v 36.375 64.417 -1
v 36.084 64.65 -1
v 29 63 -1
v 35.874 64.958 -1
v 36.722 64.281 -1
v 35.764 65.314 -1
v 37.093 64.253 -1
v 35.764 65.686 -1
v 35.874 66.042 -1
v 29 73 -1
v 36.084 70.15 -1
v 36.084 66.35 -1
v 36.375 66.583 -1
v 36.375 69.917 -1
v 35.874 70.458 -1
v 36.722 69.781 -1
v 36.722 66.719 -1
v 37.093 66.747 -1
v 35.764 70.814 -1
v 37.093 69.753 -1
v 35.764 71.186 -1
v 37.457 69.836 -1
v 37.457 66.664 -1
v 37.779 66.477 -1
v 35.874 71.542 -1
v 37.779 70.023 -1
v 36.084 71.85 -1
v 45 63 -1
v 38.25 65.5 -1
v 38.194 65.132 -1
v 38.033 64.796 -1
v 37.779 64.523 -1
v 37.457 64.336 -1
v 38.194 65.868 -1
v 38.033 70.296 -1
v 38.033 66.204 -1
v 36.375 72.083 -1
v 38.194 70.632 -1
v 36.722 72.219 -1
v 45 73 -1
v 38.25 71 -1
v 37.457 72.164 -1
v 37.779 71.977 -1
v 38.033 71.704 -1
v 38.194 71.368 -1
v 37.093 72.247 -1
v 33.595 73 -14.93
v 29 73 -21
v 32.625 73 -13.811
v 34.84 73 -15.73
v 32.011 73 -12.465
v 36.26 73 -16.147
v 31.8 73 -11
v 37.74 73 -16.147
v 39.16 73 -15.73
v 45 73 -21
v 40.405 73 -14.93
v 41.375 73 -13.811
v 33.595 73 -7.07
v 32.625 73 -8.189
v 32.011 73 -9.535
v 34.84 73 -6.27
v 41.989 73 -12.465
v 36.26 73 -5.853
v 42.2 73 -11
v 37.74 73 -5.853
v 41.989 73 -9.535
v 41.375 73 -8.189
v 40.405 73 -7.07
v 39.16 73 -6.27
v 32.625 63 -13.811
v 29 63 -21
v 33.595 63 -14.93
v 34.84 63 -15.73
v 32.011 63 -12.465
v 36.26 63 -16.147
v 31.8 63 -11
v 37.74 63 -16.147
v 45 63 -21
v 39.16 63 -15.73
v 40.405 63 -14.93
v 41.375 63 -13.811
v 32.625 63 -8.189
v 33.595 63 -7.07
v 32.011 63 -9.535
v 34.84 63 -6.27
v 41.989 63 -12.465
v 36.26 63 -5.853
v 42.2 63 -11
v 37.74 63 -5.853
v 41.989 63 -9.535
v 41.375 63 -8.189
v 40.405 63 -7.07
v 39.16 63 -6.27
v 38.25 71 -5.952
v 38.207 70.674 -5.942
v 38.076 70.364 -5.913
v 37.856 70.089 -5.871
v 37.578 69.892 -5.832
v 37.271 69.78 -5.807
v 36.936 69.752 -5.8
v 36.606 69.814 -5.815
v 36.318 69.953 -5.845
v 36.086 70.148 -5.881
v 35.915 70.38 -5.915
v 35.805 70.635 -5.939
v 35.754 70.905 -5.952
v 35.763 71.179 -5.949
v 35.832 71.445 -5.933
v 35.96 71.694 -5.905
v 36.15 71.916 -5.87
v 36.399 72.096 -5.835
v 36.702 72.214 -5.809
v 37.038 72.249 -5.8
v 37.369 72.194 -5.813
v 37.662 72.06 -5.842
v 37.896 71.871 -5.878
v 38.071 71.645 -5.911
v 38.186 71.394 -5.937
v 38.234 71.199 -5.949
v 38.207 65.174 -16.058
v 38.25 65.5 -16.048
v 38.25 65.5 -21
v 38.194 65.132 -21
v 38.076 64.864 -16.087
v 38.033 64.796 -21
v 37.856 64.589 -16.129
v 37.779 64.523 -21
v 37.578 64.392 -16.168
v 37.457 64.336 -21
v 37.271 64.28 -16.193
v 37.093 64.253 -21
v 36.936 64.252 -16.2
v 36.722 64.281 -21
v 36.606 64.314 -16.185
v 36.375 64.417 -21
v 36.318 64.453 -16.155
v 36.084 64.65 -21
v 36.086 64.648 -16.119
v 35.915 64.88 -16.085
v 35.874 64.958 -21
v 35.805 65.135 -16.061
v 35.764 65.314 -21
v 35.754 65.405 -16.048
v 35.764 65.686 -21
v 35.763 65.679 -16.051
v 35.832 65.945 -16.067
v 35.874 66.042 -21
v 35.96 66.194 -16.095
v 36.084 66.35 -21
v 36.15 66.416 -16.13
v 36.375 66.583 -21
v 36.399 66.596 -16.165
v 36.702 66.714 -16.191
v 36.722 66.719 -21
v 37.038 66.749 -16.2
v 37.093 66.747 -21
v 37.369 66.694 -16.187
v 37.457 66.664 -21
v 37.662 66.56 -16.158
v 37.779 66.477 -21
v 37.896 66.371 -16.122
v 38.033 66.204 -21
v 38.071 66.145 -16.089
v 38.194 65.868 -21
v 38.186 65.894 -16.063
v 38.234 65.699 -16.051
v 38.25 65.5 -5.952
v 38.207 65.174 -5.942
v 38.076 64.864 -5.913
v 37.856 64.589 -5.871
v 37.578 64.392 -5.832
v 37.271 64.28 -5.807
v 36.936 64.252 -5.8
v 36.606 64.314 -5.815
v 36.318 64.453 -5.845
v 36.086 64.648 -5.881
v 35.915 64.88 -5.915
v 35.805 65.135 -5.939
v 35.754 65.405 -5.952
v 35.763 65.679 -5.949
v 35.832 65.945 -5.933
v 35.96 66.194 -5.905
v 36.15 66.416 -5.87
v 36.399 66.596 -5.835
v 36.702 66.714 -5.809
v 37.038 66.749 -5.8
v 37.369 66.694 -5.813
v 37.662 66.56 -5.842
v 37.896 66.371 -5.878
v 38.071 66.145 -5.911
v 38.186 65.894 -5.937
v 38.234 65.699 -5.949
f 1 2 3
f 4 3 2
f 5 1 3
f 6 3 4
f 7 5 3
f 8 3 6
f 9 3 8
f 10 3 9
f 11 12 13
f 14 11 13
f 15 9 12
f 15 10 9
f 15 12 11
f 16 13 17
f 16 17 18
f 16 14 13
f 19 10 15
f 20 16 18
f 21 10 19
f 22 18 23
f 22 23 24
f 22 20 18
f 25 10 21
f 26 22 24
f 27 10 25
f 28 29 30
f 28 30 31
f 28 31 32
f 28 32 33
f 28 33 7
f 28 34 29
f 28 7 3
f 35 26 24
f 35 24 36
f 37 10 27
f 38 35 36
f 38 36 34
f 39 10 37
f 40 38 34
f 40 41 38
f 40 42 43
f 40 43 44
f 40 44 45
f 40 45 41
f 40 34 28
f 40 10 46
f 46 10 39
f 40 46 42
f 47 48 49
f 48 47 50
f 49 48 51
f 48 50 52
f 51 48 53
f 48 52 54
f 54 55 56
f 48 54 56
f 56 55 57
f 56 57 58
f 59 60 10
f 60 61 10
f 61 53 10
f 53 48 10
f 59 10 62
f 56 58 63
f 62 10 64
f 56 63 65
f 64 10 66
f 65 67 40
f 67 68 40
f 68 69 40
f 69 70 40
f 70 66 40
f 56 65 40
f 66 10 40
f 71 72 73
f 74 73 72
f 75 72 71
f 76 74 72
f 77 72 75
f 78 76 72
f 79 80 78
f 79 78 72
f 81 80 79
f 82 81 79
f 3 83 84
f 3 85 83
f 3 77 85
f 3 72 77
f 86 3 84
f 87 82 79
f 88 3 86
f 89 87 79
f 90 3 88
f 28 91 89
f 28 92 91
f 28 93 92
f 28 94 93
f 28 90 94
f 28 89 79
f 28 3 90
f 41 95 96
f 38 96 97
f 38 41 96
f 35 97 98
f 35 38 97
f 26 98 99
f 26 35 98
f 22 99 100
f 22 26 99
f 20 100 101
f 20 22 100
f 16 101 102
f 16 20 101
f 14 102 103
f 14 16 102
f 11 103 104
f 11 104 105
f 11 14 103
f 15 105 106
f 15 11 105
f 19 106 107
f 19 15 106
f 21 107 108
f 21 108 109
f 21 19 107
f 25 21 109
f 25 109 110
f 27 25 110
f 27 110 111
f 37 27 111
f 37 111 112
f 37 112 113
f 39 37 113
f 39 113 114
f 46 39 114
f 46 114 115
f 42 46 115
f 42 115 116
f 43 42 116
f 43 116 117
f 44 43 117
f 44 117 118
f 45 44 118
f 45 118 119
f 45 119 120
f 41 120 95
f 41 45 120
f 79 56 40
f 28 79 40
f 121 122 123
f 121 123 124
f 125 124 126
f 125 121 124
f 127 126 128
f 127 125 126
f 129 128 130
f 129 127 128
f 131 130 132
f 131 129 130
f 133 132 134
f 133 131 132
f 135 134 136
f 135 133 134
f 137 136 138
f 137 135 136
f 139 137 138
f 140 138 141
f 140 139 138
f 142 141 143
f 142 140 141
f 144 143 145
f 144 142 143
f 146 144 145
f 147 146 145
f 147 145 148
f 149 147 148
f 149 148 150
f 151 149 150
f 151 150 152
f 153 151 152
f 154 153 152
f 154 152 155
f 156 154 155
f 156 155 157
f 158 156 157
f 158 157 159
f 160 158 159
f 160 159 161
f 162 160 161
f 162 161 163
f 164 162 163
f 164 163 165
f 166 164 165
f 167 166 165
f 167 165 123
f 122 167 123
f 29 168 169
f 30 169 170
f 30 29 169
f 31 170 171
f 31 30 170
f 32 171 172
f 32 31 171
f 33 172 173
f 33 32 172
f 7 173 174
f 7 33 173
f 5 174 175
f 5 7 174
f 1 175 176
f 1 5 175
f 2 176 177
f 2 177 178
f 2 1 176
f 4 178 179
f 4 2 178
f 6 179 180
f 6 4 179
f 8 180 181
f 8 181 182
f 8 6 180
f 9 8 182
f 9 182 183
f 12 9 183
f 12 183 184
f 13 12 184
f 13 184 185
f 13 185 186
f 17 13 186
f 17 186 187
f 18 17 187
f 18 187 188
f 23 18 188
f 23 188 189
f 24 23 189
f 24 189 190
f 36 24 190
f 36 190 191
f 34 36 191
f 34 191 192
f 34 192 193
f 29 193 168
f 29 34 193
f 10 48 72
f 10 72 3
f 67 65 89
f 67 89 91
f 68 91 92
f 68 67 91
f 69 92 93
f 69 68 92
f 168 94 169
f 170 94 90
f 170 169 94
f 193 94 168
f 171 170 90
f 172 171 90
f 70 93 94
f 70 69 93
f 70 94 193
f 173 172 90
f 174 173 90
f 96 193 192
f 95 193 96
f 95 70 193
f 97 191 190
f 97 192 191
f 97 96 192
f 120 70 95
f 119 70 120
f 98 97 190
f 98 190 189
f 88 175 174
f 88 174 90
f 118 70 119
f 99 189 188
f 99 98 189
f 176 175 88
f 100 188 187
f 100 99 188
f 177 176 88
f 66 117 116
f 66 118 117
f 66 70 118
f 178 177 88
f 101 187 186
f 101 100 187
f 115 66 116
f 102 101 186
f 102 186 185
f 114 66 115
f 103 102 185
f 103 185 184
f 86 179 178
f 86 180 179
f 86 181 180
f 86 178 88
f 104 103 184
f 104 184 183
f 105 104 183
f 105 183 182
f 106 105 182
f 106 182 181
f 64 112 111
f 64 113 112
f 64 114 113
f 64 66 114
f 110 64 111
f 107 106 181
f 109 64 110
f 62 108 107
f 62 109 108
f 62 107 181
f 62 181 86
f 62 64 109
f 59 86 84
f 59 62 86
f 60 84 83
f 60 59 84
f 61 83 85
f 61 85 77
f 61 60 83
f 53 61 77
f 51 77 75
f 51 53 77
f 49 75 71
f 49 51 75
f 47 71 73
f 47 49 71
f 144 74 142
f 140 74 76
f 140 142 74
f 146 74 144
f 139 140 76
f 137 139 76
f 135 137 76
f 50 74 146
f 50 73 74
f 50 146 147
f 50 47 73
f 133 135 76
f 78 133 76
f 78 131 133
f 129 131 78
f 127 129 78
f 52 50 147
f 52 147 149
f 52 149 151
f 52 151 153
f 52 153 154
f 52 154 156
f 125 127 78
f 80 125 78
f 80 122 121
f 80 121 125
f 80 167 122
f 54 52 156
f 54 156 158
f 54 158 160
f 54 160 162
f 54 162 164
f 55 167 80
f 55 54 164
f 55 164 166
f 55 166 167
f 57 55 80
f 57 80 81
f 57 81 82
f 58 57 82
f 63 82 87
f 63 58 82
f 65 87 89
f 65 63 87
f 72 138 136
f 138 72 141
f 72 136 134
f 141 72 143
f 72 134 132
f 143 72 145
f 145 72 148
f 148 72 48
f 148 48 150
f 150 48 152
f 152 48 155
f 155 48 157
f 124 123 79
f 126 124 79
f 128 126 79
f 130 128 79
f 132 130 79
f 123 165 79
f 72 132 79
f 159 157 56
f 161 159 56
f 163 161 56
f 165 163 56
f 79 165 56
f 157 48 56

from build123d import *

# Parameters (mm, degrees)
CYLINDER938_R          = 1.25
CYLINDER938_DEPTH      = 10
CYLINDER938_ROLL_ANGLE = 90
CYLINDER939_R          = 1.25
CYLINDER939_DEPTH      = 20
CYLINDER939_ROLL_ANGLE = 90
CYLINDER937_R          = 5.2
CYLINDER937_DEPTH      = 10
BOX555_W               = 16
BOX555_H               = 20
BOX555_DEPTH           = 10
CUT690_ROLL_ANGLE      = 90


with BuildPart() as cylinder1081:
    # Cylinder938 → Cylinder938 (new body)
    with BuildSketch(Plane.XY):
        Circle(CYLINDER938_R)
    extrude(amount=CYLINDER938_DEPTH)


with BuildPart() as cylinder1081_1:
    # Cylinder938 roll: moved
    add(cylinder1081.part.rotate(Axis((0, 0, 0), (1, 0, 0)), CYLINDER938_ROLL_ANGLE))


with BuildPart() as cylinder1081_2:
    # Cylinder938 placement: moved
    add(cylinder1081_1.part.moved(Location((0, 10, 2))))


with BuildPart() as fusion587:
    # Cylinder939 → Cylinder939 (new body)
    with BuildSketch(Plane.XY):
        Circle(CYLINDER939_R)
    extrude(amount=CYLINDER939_DEPTH)


with BuildPart() as fusion587_1:
    # Cylinder939 roll: moved
    add(fusion587.part.rotate(Axis((0, 0, 0), (1, 0, 0)), CYLINDER939_ROLL_ANGLE))


with BuildPart() as fusion587_2:
    # Cylinder939 placement: moved
    add(fusion587_1.part.moved(Location((0, 10, 7.5))))

    # Fusion587: union Cylinder1081
    add(cylinder1081_2.part)


with BuildPart() as cylinder1080:
    # Cylinder937 → Cylinder937 (new body)
    with BuildSketch(Plane.XY):
        Circle(CYLINDER937_R)
    extrude(amount=CYLINDER937_DEPTH)


with BuildPart() as servo_shaft_coupler_holes:
    # Box555 → Box555 (new body)
    with BuildSketch(Plane(origin=(-8, -10, 0), x_dir=(1, 0, 0), z_dir=(0, 0, 1))):
        with Locations((8, 10)):
            Rectangle(BOX555_W, BOX555_H)
    extrude(amount=BOX555_DEPTH)

    # Cut689: cut Cylinder1080
    add(cylinder1080.part, mode=Mode.SUBTRACT)

    # Cut690: cut Fusion587
    add(fusion587_2.part, mode=Mode.SUBTRACT)


with BuildPart() as servo_shaft_coupler_holes_1:
    # Cut690 roll: moved
    add(servo_shaft_coupler_holes.part.rotate(Axis((0, 0, 0), (1, 0, 0)), CUT690_ROLL_ANGLE))


with BuildPart() as servo_shaft_coupler_holes_2:
    # Cut690 placement: moved
    add(servo_shaft_coupler_holes_1.part.moved(Location((37, 73, -11))))


solid = servo_shaft_coupler_holes_2.part
